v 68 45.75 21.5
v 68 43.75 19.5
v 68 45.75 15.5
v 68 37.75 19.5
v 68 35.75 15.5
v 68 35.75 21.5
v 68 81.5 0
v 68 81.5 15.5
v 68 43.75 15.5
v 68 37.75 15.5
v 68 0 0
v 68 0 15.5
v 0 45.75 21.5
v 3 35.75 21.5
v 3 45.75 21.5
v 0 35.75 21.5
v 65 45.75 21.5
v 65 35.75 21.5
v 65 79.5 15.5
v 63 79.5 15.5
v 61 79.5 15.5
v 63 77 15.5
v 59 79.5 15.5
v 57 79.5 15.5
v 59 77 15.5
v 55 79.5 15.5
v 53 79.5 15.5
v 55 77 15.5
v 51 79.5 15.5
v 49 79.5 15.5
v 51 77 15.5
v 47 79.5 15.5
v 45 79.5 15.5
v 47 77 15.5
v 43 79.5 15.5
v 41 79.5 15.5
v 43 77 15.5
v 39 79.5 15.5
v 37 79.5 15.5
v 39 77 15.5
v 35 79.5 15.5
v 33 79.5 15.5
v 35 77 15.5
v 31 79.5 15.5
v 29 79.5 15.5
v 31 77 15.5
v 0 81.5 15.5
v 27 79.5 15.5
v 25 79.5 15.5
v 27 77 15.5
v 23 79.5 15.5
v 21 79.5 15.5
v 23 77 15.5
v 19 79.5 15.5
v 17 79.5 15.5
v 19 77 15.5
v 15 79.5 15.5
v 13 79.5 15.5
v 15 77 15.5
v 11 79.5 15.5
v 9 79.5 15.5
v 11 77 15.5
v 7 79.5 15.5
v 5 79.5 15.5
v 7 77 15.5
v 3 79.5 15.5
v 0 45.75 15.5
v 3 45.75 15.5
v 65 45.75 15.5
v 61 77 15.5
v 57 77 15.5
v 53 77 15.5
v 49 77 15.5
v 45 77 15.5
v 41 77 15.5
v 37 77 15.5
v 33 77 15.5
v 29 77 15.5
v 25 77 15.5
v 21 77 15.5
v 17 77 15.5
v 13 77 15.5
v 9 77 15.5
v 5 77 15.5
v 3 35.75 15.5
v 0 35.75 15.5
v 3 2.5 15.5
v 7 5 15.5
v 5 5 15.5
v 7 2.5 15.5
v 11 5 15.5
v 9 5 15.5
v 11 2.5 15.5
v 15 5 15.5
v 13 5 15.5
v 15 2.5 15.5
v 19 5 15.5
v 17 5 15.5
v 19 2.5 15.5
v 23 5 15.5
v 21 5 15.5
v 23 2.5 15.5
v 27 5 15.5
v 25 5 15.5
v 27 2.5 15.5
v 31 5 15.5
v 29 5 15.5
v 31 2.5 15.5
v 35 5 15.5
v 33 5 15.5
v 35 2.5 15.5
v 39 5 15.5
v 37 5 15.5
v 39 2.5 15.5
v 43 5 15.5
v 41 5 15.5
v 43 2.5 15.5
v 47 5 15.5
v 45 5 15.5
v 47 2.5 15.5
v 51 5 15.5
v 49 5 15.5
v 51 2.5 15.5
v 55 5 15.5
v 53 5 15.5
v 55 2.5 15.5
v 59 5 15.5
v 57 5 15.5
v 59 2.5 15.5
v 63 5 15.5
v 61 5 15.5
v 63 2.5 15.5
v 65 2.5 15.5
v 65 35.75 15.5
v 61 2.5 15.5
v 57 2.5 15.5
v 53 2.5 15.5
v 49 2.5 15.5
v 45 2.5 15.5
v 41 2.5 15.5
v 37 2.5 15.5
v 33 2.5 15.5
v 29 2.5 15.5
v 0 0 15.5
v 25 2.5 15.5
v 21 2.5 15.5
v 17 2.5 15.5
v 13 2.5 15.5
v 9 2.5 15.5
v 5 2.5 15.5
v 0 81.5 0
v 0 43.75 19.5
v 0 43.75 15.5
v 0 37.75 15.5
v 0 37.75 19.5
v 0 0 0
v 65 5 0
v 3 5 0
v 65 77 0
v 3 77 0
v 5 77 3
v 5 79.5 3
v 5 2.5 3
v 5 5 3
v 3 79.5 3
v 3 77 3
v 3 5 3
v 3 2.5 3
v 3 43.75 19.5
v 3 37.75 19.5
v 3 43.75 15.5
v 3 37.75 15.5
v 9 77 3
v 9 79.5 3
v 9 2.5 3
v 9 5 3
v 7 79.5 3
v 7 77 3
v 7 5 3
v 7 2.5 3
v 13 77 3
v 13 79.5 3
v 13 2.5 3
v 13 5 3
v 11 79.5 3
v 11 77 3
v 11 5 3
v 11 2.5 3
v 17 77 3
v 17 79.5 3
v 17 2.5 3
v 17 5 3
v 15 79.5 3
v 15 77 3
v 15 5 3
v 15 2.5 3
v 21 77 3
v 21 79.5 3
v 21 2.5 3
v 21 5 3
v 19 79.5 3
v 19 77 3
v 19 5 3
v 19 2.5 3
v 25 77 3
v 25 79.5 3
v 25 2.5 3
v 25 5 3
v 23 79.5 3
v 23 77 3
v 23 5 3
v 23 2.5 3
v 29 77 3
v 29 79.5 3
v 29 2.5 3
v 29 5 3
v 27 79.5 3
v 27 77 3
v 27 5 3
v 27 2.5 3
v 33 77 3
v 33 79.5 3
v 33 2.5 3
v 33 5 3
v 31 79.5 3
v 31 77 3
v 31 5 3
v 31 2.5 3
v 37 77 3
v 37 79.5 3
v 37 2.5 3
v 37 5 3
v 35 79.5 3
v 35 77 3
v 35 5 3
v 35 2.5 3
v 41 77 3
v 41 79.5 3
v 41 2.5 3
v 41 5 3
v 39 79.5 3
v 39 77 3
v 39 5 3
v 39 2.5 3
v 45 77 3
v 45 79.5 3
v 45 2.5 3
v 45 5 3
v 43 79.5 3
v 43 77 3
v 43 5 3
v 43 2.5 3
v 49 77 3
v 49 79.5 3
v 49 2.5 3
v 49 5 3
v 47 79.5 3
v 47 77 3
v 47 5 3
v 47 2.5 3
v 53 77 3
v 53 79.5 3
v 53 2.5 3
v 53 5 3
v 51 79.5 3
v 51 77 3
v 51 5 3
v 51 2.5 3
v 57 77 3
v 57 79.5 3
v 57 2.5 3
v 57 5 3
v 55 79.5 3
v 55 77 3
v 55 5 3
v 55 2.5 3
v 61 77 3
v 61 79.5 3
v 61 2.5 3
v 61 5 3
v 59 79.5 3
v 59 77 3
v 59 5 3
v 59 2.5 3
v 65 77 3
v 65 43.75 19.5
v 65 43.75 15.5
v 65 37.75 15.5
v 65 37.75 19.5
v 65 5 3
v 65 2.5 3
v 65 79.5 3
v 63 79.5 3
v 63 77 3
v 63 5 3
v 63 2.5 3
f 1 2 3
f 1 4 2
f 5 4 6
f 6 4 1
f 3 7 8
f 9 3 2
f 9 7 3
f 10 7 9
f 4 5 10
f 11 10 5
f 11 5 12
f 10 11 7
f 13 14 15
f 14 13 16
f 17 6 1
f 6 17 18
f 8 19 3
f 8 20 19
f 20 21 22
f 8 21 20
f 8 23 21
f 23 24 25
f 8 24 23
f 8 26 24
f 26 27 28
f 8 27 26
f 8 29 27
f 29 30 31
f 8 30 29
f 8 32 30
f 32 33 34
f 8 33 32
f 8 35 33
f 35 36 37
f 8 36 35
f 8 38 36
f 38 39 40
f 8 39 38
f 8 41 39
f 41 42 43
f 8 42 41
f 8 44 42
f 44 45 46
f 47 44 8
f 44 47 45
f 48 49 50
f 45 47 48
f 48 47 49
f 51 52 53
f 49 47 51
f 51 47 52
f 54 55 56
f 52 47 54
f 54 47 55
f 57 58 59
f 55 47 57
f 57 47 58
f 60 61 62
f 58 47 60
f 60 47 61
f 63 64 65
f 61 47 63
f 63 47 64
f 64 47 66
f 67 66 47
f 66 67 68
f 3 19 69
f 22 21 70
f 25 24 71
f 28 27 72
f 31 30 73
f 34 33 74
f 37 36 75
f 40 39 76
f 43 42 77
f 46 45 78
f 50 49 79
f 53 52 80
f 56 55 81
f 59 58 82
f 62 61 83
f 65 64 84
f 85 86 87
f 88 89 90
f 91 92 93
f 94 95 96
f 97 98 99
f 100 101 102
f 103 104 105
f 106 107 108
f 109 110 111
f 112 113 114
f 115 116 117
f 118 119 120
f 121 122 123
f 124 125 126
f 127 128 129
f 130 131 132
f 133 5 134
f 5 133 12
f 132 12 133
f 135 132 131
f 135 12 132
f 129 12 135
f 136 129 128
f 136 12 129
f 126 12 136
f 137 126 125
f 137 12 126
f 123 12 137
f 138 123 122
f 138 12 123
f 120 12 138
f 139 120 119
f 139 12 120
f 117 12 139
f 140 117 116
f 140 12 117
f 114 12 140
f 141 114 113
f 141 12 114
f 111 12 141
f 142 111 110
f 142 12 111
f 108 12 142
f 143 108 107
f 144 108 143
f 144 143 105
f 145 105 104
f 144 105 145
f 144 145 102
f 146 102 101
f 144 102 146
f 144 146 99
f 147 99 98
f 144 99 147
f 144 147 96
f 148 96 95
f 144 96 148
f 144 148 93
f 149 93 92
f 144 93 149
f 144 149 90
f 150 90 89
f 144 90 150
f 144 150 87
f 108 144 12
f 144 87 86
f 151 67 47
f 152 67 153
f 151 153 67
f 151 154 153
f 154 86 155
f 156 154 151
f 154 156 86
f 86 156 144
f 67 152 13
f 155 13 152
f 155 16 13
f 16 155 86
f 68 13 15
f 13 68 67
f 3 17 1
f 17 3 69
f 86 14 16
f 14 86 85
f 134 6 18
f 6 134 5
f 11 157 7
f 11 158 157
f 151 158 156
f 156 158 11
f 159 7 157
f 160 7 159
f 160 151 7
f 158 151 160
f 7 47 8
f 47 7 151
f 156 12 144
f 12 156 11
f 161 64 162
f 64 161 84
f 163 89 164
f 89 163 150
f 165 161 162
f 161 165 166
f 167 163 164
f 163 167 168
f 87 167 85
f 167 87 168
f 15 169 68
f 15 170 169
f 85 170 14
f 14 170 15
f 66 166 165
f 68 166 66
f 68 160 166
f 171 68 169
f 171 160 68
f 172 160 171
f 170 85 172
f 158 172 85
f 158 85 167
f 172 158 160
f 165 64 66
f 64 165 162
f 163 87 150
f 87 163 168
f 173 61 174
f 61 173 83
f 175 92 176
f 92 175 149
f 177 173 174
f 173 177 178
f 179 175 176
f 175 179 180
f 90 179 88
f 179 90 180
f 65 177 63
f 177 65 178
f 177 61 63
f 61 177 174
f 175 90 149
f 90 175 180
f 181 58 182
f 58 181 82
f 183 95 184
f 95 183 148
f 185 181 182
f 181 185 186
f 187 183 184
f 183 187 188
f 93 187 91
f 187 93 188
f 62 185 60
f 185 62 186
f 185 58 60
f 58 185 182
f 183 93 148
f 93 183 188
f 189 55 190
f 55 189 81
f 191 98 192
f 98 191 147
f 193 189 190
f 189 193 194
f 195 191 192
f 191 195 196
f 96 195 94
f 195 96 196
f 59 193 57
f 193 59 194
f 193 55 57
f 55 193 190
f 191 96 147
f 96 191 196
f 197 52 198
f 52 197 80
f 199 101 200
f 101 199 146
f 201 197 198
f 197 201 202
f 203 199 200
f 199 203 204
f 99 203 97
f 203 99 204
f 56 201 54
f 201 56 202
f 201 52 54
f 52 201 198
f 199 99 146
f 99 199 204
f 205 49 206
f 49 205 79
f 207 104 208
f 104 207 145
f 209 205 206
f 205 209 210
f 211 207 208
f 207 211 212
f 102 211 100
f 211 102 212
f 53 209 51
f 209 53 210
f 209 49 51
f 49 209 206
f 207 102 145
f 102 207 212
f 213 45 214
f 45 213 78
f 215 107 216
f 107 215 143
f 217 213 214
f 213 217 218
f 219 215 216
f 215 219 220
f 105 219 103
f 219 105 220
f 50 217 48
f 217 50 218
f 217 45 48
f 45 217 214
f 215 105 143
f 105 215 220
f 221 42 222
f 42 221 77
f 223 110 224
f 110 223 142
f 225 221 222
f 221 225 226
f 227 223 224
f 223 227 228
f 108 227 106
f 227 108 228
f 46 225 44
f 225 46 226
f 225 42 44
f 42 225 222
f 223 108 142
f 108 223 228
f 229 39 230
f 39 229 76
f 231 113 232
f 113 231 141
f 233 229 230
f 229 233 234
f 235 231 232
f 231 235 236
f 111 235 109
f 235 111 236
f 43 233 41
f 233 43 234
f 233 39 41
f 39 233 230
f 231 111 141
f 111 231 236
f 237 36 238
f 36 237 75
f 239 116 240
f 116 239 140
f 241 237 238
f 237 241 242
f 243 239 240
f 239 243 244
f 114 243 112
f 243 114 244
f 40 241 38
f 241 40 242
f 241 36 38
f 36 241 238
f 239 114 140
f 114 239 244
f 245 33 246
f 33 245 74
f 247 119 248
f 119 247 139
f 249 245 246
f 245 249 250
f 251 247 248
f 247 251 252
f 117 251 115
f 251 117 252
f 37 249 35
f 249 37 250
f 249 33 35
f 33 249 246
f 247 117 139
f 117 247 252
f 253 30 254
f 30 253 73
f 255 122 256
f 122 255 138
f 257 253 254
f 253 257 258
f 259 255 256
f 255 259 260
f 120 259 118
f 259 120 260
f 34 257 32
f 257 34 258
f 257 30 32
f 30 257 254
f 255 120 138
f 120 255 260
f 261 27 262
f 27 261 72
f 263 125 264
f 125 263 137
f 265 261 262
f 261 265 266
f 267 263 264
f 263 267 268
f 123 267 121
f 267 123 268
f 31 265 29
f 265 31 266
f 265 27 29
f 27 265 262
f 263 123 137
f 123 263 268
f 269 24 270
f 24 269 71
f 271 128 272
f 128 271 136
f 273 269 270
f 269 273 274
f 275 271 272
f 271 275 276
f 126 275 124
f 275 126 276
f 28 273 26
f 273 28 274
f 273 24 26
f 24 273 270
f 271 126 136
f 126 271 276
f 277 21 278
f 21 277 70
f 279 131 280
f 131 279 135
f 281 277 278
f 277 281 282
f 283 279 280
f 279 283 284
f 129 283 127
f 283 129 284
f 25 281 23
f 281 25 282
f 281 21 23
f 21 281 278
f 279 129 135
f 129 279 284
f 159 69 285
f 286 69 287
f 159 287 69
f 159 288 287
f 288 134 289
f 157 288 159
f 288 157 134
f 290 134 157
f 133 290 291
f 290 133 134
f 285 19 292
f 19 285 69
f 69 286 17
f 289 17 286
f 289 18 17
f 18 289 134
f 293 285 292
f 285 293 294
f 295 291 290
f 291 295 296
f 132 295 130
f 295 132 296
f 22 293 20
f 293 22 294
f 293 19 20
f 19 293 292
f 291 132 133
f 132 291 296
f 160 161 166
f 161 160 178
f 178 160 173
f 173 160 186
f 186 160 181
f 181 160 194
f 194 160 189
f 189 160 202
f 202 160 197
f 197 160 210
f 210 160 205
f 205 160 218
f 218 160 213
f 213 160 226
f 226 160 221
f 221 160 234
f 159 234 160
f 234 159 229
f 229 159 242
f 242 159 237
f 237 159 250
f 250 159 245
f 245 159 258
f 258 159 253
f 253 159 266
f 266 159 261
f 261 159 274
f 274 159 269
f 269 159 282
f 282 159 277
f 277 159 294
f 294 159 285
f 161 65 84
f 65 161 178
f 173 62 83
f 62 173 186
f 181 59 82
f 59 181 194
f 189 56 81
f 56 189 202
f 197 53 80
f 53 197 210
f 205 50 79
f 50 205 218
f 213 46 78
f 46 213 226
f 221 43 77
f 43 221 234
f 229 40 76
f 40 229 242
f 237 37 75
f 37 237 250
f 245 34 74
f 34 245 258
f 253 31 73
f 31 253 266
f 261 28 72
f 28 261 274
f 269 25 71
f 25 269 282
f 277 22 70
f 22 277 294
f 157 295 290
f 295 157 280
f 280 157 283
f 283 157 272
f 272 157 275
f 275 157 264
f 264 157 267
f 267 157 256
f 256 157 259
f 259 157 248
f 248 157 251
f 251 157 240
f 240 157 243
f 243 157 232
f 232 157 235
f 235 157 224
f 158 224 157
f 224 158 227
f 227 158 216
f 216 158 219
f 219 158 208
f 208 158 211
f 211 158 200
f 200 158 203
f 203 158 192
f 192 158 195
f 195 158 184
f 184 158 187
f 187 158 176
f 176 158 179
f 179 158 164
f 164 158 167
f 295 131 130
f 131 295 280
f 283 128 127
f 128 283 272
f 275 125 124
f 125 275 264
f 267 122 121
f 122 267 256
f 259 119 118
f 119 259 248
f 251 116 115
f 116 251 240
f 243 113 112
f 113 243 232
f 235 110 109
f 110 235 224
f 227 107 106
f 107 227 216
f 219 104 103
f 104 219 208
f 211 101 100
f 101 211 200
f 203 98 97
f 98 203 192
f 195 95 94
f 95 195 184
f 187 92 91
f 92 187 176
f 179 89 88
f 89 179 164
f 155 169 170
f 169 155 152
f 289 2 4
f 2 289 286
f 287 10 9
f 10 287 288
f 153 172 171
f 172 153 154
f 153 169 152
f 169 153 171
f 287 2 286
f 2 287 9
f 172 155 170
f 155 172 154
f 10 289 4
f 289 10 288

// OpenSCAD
// Lucas Wilder - Michigan Technological University - EE 4777
// Microscope Slide Holder

// Number of slides
slides = 15;

// Slide thickness in mm
thickness = 1;

// Slide length in mm
length = 75;

//Slide width in mm
width = 25;

difference()
{
	// Union of main part to handle mounts
	union()
	{
		// Handle mounts
		translate([(4*slides+8)/2,(length+6.5)/2,(width/2)+6])
		cube(size = [4*slides+8,10,6],center = true);

		// Main body
		cube(size = [4*slides+8,length+6.5,(width/2)+3], center = false);
		
	}
	
	// Slides with tolerance
	for(i=[0:1:slides])
	{
		translate([3+(4*i),2.5,3]) 
		cube(size = [thickness+1,length+2,width],center = false);
	}
	
	// Center cut
	translate([3,5,-1])
	cube(size = [4*slides+2,length-3,width+4], center = false);
	
	//Handle slots
	translate([(4*slides+8)/2,(length+6.5)/2,(width/2)+5])
	cube(size = [4*slides+8,6,4],center = true);

}

